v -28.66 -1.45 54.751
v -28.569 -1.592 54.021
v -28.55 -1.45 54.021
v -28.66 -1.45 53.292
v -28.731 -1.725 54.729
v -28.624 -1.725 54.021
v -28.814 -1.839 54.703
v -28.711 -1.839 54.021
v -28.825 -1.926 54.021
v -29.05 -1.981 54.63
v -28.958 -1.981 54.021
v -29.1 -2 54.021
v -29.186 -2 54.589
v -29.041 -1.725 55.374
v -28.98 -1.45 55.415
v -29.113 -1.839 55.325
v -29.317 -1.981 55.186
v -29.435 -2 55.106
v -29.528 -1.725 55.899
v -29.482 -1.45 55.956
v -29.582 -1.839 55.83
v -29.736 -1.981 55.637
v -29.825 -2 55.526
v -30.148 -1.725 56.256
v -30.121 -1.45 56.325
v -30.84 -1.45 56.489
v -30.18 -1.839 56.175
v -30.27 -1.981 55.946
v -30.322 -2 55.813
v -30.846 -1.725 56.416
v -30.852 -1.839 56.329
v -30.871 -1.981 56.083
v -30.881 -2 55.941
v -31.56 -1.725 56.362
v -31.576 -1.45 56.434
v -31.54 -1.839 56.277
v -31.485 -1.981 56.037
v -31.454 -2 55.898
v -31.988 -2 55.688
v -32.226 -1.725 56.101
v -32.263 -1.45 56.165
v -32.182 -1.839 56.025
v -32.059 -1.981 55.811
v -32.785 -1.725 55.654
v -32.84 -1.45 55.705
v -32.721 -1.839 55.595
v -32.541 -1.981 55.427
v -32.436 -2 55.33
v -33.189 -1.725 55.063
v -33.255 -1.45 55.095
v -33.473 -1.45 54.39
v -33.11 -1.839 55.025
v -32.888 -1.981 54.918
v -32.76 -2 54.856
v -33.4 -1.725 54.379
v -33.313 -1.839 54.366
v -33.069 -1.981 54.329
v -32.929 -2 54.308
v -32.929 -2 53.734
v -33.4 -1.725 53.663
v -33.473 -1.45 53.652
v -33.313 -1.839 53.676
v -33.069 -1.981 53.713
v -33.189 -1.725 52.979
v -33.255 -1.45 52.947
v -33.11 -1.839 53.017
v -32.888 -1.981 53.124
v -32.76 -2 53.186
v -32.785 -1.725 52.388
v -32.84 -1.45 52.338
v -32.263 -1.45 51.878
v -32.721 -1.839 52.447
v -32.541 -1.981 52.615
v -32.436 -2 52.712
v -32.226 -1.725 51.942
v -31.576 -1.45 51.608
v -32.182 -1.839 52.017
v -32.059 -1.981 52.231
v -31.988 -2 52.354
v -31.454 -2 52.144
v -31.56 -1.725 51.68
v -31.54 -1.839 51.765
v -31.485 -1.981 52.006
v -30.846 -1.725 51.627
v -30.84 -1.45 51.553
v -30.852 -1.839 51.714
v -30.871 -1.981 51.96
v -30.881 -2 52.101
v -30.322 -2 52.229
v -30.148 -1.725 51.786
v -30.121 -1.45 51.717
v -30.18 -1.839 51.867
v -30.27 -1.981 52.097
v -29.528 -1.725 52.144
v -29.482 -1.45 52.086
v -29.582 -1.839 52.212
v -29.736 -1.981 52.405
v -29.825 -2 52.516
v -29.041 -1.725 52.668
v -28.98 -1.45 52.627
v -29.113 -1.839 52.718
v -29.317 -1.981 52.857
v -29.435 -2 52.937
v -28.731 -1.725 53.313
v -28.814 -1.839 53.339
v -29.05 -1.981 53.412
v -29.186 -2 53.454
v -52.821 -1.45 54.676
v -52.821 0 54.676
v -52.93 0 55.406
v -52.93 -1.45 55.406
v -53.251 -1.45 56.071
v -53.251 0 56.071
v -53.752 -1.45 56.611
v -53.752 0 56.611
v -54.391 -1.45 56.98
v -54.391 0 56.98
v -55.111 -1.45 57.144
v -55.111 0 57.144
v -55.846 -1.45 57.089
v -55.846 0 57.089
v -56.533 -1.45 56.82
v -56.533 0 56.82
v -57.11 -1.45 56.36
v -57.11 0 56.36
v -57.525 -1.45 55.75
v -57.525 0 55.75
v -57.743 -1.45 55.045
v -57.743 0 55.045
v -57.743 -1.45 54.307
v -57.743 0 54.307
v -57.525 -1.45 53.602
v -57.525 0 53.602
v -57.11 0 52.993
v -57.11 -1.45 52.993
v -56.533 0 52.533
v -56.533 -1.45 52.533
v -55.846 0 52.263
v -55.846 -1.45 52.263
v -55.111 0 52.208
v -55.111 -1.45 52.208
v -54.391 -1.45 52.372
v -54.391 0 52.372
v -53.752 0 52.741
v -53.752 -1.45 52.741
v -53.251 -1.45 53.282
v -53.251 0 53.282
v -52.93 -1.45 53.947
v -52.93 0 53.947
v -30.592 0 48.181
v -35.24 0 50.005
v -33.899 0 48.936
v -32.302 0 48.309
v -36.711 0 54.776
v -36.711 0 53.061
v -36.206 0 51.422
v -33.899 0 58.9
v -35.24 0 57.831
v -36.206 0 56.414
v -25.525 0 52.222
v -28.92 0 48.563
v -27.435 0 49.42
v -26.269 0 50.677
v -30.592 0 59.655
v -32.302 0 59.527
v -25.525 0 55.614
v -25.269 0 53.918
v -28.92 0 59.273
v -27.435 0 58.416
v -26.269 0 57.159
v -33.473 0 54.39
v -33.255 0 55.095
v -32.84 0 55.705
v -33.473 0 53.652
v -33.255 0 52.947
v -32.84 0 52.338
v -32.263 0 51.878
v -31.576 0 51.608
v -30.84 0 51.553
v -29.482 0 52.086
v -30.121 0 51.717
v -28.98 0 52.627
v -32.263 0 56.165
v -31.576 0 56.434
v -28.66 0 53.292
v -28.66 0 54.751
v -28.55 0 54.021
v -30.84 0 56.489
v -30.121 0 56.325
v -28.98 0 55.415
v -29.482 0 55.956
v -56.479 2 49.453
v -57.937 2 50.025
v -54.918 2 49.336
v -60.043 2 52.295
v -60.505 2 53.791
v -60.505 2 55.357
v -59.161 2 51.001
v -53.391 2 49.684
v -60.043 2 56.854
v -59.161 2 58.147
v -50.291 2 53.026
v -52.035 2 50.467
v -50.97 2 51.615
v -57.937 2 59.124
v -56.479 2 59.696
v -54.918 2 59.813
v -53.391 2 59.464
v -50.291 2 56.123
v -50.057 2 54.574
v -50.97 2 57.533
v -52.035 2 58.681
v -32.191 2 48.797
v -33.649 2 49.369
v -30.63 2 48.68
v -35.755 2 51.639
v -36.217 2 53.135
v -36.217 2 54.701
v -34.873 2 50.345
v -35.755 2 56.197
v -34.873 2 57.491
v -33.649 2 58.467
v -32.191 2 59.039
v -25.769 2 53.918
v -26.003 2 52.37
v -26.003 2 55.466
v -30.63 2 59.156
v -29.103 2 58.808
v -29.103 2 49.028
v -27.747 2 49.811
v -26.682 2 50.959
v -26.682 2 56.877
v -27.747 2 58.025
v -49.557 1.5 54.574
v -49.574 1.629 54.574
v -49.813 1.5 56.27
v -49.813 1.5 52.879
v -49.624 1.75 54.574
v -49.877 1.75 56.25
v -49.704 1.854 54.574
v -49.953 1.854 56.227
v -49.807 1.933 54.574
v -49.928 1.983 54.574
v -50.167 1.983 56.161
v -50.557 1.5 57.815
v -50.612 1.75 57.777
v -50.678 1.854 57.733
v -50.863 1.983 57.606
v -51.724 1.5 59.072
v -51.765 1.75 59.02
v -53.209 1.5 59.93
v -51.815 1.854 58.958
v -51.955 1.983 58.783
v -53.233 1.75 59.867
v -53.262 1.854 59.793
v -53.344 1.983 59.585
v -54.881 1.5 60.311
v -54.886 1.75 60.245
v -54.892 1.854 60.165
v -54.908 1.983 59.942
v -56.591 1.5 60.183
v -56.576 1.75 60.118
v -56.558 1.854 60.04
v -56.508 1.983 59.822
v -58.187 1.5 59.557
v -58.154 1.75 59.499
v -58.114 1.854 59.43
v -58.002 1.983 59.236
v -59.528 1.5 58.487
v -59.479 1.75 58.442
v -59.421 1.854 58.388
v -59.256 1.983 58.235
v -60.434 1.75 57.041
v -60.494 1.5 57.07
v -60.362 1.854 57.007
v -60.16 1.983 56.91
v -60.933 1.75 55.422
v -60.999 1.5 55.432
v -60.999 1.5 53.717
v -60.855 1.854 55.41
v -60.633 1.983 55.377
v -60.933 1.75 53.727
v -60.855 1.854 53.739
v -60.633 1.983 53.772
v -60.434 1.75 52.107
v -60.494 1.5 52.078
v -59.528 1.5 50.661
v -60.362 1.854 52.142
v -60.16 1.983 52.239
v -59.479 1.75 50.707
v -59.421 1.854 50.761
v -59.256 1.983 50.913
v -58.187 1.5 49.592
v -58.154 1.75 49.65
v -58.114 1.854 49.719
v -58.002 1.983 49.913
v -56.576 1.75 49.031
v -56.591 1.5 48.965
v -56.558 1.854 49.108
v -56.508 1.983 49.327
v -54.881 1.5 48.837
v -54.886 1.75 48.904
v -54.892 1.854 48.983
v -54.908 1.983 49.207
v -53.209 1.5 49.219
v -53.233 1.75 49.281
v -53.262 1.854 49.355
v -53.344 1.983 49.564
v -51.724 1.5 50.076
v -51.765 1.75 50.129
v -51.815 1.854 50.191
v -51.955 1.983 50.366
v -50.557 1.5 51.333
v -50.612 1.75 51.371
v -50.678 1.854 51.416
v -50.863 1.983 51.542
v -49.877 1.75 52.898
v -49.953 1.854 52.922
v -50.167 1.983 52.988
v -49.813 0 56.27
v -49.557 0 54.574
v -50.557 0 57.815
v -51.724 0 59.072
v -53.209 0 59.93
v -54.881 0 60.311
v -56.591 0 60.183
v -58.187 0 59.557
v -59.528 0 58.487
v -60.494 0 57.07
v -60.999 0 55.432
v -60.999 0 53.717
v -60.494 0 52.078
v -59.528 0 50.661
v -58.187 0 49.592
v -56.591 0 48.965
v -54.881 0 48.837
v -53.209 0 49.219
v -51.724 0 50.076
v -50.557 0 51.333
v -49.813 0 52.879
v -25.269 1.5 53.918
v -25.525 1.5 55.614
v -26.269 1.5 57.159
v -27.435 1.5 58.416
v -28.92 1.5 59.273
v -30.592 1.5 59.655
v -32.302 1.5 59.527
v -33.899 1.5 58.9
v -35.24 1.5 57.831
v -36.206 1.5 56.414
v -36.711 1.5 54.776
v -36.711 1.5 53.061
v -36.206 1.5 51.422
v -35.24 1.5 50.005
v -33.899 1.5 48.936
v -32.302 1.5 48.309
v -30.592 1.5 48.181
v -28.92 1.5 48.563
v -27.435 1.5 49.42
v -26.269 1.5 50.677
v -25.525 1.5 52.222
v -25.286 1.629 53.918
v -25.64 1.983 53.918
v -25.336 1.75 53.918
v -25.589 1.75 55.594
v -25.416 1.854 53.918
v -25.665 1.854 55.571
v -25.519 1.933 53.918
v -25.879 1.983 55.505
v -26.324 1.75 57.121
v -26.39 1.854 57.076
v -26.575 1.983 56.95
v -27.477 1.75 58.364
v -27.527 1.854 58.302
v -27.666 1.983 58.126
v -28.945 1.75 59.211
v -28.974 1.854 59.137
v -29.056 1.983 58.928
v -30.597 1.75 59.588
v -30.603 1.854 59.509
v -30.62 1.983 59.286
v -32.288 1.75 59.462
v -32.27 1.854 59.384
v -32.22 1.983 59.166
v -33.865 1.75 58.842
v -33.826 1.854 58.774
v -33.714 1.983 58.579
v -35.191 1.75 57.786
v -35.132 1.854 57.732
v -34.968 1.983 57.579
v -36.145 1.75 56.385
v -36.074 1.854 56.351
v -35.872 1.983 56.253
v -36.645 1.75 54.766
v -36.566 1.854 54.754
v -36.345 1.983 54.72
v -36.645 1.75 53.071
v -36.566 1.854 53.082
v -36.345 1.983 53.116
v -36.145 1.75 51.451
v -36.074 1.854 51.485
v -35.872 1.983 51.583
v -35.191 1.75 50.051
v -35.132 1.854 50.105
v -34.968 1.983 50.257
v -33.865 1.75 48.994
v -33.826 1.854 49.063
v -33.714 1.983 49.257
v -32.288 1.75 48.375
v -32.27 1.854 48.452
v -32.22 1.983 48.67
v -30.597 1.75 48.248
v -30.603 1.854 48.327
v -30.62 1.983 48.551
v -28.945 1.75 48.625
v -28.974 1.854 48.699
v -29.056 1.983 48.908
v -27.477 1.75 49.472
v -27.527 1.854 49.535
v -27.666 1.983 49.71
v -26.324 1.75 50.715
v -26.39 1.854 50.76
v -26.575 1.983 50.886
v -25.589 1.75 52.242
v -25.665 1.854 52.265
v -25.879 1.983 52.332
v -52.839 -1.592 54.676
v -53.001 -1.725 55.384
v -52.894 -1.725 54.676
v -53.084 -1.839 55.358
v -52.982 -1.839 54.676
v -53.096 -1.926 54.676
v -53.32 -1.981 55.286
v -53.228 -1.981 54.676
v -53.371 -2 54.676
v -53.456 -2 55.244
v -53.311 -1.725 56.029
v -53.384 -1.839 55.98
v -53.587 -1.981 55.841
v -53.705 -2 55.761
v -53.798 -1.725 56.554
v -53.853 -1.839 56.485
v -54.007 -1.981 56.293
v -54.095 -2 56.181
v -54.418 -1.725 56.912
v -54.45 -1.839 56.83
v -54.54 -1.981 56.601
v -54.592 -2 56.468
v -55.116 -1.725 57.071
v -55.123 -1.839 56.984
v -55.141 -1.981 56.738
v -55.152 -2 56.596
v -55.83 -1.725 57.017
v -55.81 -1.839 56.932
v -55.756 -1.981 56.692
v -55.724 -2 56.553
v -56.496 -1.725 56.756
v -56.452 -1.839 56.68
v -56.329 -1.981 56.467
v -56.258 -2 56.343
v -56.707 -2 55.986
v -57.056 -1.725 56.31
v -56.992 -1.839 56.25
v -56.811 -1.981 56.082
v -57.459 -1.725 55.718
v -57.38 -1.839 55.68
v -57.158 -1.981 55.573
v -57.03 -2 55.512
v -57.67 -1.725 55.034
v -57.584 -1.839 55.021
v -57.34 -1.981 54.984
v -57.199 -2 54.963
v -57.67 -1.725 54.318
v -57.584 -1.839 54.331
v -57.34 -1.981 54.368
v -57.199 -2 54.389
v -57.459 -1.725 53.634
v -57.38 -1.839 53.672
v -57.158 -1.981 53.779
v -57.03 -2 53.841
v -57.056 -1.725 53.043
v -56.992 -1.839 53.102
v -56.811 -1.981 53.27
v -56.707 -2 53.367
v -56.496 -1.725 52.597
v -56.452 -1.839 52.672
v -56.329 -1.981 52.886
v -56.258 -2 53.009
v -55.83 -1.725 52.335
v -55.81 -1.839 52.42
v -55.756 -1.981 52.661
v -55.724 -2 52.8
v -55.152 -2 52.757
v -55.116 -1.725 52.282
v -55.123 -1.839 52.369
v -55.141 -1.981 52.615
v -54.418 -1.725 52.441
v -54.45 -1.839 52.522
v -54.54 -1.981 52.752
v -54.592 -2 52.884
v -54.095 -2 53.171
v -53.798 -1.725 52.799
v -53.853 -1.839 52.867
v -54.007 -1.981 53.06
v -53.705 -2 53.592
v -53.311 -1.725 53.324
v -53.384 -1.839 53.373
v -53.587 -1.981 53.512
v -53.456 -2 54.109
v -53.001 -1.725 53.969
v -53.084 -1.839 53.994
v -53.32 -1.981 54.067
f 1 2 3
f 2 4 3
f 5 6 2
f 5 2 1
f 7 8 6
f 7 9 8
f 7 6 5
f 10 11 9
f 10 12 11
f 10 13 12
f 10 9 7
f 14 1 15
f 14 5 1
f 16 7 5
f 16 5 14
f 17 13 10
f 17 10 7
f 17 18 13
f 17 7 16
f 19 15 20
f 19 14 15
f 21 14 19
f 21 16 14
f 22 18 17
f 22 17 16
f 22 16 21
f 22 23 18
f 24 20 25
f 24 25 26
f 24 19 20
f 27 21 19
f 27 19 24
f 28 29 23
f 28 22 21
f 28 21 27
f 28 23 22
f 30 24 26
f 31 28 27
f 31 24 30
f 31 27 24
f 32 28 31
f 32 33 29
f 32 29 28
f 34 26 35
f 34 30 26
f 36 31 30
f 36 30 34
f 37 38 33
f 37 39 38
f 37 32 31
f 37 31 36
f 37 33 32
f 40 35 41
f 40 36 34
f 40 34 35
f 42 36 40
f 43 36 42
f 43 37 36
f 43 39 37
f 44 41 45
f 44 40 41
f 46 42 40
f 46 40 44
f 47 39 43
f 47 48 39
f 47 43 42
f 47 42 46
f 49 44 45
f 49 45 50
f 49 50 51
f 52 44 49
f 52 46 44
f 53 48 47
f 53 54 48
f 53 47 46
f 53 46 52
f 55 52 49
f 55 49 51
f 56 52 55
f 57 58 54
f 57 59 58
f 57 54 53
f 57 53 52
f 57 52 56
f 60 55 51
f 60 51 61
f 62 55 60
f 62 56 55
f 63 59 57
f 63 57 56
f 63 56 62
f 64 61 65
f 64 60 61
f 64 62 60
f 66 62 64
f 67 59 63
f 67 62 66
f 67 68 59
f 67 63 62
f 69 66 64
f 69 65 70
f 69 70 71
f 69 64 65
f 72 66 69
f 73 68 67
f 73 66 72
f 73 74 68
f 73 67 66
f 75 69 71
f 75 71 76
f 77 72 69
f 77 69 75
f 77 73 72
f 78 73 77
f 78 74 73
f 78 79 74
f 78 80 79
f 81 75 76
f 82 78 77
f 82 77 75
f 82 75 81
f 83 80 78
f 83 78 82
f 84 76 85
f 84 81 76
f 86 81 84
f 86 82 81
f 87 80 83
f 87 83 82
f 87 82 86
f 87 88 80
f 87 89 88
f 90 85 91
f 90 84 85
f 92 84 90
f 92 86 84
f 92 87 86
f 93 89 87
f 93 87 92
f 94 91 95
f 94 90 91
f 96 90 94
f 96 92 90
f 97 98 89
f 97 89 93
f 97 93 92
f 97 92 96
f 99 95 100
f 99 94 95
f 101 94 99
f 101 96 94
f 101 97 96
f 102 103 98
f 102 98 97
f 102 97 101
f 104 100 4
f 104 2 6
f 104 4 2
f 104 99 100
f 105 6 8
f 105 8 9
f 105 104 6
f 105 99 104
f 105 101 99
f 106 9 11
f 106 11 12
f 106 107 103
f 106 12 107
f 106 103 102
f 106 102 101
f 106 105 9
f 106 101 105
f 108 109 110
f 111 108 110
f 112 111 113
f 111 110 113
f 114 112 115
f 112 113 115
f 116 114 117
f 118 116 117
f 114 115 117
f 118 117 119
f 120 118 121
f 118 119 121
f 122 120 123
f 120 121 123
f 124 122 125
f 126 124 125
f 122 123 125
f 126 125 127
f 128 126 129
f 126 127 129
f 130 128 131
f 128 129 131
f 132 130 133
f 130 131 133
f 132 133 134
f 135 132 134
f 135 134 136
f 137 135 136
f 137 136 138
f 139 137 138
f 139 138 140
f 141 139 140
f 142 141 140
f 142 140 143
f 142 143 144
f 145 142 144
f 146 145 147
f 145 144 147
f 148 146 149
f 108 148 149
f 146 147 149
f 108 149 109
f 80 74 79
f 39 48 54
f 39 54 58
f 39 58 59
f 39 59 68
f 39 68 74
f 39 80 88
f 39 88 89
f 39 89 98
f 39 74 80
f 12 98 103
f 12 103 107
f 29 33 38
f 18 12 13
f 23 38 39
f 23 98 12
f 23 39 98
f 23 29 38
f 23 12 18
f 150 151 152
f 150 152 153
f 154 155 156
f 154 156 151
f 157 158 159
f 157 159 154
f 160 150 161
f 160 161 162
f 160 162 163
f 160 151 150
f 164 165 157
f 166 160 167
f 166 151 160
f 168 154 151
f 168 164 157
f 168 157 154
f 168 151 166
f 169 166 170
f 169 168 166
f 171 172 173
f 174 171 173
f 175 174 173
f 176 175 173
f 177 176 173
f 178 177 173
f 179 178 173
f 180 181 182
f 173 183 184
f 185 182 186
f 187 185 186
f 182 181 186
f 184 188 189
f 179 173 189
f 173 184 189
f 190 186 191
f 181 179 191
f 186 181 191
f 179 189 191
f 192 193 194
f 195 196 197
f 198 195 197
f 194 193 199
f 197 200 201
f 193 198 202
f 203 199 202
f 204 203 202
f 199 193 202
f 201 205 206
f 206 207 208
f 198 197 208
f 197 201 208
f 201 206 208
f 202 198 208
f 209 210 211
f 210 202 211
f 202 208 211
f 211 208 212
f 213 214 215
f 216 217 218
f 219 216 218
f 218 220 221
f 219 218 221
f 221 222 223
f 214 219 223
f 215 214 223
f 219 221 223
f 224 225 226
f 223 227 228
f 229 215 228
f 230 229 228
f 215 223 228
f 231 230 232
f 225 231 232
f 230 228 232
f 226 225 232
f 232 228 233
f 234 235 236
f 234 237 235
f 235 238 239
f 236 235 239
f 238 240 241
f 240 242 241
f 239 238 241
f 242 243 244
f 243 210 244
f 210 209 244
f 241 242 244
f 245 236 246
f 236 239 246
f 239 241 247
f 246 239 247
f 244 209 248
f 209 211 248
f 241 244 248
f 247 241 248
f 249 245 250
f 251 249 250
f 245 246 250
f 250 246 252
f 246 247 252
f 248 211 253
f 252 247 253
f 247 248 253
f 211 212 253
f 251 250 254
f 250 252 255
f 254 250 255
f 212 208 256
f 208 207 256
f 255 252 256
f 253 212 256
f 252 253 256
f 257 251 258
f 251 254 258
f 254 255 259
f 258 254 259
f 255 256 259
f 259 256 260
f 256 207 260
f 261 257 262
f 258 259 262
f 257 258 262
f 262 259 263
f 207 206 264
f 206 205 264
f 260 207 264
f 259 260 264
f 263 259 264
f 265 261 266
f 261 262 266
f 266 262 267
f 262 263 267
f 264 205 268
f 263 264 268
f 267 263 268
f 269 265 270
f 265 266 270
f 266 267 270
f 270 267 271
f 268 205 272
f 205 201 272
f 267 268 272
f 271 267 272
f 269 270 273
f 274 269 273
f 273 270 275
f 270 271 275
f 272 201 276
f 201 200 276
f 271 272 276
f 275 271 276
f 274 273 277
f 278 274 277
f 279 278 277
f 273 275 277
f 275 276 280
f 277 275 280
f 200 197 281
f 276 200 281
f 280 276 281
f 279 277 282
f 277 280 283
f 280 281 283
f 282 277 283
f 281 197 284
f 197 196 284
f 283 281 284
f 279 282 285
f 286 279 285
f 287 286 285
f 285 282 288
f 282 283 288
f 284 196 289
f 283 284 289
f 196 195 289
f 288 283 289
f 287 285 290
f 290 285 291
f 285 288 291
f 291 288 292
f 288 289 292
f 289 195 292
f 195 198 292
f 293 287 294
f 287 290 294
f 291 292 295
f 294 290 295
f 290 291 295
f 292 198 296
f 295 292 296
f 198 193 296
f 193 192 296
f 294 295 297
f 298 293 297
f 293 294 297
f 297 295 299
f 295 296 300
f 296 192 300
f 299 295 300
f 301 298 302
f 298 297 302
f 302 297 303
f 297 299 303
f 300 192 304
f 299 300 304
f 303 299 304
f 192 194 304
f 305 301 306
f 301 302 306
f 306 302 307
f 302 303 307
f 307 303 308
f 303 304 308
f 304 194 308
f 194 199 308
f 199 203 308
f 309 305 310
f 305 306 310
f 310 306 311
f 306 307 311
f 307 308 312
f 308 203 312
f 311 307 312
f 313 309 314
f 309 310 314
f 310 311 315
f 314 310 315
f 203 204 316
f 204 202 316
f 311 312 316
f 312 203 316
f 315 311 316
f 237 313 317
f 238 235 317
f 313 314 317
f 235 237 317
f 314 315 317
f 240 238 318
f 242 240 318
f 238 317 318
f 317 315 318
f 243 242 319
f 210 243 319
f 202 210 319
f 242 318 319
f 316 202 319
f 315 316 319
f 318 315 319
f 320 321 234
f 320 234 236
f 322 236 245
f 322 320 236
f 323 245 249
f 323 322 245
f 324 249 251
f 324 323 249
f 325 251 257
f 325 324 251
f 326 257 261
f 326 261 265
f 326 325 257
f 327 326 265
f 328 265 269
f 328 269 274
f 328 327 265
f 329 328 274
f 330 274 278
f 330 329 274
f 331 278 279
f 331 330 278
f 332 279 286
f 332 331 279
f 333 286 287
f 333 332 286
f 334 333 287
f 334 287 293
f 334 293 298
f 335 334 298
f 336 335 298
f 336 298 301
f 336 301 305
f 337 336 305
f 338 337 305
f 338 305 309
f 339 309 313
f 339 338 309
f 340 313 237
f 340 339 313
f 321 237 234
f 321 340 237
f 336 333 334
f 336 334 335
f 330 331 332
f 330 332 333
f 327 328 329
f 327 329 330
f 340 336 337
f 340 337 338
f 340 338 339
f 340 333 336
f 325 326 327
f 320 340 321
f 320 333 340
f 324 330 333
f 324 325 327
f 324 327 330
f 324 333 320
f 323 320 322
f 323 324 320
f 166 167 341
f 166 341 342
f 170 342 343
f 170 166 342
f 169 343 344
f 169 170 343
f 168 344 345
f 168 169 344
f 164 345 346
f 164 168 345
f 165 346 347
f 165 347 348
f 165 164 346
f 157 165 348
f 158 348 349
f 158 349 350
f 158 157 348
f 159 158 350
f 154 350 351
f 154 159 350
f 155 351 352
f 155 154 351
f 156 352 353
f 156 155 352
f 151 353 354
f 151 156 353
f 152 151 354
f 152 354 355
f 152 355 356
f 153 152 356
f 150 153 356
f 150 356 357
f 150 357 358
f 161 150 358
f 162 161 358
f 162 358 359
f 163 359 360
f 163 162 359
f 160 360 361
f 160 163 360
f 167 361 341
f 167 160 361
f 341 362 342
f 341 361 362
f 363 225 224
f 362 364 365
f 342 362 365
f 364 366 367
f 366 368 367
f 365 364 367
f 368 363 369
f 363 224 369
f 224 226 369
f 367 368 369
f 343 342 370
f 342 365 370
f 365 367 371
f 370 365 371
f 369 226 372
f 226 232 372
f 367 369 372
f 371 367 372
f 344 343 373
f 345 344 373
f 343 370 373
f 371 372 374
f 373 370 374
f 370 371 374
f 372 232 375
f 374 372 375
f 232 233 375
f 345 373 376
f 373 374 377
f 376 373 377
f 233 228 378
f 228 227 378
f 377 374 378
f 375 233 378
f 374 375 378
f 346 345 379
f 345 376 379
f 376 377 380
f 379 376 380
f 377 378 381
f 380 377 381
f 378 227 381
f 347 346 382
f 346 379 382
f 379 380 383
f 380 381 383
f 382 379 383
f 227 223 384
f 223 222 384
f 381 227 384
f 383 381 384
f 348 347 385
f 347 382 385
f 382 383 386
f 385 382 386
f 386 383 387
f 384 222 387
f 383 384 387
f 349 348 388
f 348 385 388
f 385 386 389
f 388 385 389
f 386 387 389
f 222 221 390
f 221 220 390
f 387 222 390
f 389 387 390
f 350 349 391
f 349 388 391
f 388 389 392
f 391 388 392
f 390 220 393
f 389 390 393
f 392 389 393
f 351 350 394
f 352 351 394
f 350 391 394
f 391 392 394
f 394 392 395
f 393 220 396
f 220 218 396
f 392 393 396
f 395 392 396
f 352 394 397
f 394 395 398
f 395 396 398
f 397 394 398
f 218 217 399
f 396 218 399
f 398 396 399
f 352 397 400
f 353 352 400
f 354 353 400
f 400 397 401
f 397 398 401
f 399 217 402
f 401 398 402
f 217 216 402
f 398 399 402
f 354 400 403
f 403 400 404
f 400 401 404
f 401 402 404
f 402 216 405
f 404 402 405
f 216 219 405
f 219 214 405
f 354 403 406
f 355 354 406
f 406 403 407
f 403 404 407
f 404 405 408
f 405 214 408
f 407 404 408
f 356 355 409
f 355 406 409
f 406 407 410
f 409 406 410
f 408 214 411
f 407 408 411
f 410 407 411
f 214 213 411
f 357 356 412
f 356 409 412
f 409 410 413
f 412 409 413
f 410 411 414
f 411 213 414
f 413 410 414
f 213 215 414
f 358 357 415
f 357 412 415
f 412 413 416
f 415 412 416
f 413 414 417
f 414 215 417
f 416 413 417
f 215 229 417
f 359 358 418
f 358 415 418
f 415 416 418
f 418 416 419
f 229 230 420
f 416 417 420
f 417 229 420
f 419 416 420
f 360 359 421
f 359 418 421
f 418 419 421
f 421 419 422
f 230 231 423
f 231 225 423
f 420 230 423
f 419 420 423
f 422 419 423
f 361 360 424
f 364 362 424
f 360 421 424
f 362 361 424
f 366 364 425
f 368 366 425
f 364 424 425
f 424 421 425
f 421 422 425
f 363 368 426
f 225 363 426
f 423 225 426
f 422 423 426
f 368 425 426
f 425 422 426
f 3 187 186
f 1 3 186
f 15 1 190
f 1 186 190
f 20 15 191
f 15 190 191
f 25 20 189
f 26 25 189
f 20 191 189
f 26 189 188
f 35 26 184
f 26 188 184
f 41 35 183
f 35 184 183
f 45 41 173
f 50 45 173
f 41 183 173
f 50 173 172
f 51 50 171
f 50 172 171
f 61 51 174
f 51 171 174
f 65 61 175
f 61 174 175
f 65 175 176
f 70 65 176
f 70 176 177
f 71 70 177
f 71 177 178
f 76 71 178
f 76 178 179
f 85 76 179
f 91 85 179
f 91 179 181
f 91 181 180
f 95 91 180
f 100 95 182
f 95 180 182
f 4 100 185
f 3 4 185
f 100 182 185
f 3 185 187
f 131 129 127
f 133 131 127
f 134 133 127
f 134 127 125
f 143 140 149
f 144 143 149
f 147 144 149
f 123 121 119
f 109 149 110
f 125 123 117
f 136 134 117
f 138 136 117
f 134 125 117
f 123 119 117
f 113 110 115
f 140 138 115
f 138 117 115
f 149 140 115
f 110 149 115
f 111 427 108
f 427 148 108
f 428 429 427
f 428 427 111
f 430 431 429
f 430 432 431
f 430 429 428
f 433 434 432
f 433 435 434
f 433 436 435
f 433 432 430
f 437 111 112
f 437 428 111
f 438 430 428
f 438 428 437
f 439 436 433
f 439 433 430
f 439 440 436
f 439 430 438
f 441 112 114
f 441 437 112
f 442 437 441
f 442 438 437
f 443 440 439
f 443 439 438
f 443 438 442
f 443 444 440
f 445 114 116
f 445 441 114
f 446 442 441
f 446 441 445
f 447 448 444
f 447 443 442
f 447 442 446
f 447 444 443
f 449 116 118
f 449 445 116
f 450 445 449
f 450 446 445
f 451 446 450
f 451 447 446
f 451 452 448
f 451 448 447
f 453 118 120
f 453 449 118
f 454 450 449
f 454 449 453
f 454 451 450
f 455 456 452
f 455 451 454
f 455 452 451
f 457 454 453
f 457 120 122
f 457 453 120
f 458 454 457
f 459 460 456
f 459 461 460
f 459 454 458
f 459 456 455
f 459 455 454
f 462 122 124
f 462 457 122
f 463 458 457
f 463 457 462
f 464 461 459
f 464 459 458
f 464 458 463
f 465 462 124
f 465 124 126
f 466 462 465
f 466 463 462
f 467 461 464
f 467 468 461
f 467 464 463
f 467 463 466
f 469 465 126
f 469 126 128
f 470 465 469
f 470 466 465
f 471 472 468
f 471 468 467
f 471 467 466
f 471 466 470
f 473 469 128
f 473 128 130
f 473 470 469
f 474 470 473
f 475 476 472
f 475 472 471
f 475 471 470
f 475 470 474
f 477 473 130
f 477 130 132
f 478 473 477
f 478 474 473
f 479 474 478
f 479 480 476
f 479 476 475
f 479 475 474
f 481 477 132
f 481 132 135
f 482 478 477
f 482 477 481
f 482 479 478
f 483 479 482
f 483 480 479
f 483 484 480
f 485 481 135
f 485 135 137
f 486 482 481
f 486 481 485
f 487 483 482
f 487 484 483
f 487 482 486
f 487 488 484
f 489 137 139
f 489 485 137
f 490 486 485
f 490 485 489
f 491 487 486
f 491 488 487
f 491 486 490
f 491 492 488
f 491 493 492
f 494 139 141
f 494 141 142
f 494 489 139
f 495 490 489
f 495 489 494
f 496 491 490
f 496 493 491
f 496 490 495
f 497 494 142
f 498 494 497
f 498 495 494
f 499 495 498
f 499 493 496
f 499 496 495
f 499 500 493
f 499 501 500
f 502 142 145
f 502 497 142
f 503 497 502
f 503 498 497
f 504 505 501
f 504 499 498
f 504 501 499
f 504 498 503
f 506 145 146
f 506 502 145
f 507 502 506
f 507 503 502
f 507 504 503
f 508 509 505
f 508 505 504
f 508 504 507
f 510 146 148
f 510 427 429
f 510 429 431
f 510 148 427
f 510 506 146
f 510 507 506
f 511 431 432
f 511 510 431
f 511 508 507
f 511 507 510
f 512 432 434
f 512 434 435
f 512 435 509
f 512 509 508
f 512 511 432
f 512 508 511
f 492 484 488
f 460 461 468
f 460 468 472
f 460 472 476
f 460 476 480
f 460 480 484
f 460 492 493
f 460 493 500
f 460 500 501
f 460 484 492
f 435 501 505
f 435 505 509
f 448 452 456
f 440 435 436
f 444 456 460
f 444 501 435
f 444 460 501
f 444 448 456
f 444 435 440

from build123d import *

# Parameters (mm, degrees)
F0_R     = 5.7531
F1_DEPTH = 2
F2_R     = 0.5
F3_R     = 2.475
F4_DEPTH = 2
F5_R     = 0.55


with BuildPart() as f1:
    # F0 (on Front) → F1 (new body)
    with BuildSketch(Plane.XZ):
        with Locations((-31.022297, 53.91805)):
            Circle(F0_R)
        with Locations((-55.310542, 54.574311)):
            Circle(F0_R)
    extrude(amount=-F1_DEPTH)

    # F2
    f2_edges = [f1.edges().sort_by_distance(p)[0] for p in [
        (-36.775397, 2, 53.91805),
        (-61.063642, 2, 54.574311),
    ]]
    fillet(f2_edges, radius=F2_R)


with BuildPart() as f4:
    # F3 (on Front) → F4 (new body)
    with BuildSketch(Plane.XZ):
        with Locations((-55.295511, 54.676309)):
            Circle(F3_R)
        with Locations((-31.025198, 54.021109)):
            Circle(F3_R)
    extrude(amount=F4_DEPTH)

    # F5
    f5_edges = [f4.edges().sort_by_distance(p)[0] for p in [
        (-57.770511, -2, 54.676309),
        (-33.500198, -2, 54.021109),
    ]]
    fillet(f5_edges, radius=F5_R)


solid = Compound([f1.part, f4.part])
